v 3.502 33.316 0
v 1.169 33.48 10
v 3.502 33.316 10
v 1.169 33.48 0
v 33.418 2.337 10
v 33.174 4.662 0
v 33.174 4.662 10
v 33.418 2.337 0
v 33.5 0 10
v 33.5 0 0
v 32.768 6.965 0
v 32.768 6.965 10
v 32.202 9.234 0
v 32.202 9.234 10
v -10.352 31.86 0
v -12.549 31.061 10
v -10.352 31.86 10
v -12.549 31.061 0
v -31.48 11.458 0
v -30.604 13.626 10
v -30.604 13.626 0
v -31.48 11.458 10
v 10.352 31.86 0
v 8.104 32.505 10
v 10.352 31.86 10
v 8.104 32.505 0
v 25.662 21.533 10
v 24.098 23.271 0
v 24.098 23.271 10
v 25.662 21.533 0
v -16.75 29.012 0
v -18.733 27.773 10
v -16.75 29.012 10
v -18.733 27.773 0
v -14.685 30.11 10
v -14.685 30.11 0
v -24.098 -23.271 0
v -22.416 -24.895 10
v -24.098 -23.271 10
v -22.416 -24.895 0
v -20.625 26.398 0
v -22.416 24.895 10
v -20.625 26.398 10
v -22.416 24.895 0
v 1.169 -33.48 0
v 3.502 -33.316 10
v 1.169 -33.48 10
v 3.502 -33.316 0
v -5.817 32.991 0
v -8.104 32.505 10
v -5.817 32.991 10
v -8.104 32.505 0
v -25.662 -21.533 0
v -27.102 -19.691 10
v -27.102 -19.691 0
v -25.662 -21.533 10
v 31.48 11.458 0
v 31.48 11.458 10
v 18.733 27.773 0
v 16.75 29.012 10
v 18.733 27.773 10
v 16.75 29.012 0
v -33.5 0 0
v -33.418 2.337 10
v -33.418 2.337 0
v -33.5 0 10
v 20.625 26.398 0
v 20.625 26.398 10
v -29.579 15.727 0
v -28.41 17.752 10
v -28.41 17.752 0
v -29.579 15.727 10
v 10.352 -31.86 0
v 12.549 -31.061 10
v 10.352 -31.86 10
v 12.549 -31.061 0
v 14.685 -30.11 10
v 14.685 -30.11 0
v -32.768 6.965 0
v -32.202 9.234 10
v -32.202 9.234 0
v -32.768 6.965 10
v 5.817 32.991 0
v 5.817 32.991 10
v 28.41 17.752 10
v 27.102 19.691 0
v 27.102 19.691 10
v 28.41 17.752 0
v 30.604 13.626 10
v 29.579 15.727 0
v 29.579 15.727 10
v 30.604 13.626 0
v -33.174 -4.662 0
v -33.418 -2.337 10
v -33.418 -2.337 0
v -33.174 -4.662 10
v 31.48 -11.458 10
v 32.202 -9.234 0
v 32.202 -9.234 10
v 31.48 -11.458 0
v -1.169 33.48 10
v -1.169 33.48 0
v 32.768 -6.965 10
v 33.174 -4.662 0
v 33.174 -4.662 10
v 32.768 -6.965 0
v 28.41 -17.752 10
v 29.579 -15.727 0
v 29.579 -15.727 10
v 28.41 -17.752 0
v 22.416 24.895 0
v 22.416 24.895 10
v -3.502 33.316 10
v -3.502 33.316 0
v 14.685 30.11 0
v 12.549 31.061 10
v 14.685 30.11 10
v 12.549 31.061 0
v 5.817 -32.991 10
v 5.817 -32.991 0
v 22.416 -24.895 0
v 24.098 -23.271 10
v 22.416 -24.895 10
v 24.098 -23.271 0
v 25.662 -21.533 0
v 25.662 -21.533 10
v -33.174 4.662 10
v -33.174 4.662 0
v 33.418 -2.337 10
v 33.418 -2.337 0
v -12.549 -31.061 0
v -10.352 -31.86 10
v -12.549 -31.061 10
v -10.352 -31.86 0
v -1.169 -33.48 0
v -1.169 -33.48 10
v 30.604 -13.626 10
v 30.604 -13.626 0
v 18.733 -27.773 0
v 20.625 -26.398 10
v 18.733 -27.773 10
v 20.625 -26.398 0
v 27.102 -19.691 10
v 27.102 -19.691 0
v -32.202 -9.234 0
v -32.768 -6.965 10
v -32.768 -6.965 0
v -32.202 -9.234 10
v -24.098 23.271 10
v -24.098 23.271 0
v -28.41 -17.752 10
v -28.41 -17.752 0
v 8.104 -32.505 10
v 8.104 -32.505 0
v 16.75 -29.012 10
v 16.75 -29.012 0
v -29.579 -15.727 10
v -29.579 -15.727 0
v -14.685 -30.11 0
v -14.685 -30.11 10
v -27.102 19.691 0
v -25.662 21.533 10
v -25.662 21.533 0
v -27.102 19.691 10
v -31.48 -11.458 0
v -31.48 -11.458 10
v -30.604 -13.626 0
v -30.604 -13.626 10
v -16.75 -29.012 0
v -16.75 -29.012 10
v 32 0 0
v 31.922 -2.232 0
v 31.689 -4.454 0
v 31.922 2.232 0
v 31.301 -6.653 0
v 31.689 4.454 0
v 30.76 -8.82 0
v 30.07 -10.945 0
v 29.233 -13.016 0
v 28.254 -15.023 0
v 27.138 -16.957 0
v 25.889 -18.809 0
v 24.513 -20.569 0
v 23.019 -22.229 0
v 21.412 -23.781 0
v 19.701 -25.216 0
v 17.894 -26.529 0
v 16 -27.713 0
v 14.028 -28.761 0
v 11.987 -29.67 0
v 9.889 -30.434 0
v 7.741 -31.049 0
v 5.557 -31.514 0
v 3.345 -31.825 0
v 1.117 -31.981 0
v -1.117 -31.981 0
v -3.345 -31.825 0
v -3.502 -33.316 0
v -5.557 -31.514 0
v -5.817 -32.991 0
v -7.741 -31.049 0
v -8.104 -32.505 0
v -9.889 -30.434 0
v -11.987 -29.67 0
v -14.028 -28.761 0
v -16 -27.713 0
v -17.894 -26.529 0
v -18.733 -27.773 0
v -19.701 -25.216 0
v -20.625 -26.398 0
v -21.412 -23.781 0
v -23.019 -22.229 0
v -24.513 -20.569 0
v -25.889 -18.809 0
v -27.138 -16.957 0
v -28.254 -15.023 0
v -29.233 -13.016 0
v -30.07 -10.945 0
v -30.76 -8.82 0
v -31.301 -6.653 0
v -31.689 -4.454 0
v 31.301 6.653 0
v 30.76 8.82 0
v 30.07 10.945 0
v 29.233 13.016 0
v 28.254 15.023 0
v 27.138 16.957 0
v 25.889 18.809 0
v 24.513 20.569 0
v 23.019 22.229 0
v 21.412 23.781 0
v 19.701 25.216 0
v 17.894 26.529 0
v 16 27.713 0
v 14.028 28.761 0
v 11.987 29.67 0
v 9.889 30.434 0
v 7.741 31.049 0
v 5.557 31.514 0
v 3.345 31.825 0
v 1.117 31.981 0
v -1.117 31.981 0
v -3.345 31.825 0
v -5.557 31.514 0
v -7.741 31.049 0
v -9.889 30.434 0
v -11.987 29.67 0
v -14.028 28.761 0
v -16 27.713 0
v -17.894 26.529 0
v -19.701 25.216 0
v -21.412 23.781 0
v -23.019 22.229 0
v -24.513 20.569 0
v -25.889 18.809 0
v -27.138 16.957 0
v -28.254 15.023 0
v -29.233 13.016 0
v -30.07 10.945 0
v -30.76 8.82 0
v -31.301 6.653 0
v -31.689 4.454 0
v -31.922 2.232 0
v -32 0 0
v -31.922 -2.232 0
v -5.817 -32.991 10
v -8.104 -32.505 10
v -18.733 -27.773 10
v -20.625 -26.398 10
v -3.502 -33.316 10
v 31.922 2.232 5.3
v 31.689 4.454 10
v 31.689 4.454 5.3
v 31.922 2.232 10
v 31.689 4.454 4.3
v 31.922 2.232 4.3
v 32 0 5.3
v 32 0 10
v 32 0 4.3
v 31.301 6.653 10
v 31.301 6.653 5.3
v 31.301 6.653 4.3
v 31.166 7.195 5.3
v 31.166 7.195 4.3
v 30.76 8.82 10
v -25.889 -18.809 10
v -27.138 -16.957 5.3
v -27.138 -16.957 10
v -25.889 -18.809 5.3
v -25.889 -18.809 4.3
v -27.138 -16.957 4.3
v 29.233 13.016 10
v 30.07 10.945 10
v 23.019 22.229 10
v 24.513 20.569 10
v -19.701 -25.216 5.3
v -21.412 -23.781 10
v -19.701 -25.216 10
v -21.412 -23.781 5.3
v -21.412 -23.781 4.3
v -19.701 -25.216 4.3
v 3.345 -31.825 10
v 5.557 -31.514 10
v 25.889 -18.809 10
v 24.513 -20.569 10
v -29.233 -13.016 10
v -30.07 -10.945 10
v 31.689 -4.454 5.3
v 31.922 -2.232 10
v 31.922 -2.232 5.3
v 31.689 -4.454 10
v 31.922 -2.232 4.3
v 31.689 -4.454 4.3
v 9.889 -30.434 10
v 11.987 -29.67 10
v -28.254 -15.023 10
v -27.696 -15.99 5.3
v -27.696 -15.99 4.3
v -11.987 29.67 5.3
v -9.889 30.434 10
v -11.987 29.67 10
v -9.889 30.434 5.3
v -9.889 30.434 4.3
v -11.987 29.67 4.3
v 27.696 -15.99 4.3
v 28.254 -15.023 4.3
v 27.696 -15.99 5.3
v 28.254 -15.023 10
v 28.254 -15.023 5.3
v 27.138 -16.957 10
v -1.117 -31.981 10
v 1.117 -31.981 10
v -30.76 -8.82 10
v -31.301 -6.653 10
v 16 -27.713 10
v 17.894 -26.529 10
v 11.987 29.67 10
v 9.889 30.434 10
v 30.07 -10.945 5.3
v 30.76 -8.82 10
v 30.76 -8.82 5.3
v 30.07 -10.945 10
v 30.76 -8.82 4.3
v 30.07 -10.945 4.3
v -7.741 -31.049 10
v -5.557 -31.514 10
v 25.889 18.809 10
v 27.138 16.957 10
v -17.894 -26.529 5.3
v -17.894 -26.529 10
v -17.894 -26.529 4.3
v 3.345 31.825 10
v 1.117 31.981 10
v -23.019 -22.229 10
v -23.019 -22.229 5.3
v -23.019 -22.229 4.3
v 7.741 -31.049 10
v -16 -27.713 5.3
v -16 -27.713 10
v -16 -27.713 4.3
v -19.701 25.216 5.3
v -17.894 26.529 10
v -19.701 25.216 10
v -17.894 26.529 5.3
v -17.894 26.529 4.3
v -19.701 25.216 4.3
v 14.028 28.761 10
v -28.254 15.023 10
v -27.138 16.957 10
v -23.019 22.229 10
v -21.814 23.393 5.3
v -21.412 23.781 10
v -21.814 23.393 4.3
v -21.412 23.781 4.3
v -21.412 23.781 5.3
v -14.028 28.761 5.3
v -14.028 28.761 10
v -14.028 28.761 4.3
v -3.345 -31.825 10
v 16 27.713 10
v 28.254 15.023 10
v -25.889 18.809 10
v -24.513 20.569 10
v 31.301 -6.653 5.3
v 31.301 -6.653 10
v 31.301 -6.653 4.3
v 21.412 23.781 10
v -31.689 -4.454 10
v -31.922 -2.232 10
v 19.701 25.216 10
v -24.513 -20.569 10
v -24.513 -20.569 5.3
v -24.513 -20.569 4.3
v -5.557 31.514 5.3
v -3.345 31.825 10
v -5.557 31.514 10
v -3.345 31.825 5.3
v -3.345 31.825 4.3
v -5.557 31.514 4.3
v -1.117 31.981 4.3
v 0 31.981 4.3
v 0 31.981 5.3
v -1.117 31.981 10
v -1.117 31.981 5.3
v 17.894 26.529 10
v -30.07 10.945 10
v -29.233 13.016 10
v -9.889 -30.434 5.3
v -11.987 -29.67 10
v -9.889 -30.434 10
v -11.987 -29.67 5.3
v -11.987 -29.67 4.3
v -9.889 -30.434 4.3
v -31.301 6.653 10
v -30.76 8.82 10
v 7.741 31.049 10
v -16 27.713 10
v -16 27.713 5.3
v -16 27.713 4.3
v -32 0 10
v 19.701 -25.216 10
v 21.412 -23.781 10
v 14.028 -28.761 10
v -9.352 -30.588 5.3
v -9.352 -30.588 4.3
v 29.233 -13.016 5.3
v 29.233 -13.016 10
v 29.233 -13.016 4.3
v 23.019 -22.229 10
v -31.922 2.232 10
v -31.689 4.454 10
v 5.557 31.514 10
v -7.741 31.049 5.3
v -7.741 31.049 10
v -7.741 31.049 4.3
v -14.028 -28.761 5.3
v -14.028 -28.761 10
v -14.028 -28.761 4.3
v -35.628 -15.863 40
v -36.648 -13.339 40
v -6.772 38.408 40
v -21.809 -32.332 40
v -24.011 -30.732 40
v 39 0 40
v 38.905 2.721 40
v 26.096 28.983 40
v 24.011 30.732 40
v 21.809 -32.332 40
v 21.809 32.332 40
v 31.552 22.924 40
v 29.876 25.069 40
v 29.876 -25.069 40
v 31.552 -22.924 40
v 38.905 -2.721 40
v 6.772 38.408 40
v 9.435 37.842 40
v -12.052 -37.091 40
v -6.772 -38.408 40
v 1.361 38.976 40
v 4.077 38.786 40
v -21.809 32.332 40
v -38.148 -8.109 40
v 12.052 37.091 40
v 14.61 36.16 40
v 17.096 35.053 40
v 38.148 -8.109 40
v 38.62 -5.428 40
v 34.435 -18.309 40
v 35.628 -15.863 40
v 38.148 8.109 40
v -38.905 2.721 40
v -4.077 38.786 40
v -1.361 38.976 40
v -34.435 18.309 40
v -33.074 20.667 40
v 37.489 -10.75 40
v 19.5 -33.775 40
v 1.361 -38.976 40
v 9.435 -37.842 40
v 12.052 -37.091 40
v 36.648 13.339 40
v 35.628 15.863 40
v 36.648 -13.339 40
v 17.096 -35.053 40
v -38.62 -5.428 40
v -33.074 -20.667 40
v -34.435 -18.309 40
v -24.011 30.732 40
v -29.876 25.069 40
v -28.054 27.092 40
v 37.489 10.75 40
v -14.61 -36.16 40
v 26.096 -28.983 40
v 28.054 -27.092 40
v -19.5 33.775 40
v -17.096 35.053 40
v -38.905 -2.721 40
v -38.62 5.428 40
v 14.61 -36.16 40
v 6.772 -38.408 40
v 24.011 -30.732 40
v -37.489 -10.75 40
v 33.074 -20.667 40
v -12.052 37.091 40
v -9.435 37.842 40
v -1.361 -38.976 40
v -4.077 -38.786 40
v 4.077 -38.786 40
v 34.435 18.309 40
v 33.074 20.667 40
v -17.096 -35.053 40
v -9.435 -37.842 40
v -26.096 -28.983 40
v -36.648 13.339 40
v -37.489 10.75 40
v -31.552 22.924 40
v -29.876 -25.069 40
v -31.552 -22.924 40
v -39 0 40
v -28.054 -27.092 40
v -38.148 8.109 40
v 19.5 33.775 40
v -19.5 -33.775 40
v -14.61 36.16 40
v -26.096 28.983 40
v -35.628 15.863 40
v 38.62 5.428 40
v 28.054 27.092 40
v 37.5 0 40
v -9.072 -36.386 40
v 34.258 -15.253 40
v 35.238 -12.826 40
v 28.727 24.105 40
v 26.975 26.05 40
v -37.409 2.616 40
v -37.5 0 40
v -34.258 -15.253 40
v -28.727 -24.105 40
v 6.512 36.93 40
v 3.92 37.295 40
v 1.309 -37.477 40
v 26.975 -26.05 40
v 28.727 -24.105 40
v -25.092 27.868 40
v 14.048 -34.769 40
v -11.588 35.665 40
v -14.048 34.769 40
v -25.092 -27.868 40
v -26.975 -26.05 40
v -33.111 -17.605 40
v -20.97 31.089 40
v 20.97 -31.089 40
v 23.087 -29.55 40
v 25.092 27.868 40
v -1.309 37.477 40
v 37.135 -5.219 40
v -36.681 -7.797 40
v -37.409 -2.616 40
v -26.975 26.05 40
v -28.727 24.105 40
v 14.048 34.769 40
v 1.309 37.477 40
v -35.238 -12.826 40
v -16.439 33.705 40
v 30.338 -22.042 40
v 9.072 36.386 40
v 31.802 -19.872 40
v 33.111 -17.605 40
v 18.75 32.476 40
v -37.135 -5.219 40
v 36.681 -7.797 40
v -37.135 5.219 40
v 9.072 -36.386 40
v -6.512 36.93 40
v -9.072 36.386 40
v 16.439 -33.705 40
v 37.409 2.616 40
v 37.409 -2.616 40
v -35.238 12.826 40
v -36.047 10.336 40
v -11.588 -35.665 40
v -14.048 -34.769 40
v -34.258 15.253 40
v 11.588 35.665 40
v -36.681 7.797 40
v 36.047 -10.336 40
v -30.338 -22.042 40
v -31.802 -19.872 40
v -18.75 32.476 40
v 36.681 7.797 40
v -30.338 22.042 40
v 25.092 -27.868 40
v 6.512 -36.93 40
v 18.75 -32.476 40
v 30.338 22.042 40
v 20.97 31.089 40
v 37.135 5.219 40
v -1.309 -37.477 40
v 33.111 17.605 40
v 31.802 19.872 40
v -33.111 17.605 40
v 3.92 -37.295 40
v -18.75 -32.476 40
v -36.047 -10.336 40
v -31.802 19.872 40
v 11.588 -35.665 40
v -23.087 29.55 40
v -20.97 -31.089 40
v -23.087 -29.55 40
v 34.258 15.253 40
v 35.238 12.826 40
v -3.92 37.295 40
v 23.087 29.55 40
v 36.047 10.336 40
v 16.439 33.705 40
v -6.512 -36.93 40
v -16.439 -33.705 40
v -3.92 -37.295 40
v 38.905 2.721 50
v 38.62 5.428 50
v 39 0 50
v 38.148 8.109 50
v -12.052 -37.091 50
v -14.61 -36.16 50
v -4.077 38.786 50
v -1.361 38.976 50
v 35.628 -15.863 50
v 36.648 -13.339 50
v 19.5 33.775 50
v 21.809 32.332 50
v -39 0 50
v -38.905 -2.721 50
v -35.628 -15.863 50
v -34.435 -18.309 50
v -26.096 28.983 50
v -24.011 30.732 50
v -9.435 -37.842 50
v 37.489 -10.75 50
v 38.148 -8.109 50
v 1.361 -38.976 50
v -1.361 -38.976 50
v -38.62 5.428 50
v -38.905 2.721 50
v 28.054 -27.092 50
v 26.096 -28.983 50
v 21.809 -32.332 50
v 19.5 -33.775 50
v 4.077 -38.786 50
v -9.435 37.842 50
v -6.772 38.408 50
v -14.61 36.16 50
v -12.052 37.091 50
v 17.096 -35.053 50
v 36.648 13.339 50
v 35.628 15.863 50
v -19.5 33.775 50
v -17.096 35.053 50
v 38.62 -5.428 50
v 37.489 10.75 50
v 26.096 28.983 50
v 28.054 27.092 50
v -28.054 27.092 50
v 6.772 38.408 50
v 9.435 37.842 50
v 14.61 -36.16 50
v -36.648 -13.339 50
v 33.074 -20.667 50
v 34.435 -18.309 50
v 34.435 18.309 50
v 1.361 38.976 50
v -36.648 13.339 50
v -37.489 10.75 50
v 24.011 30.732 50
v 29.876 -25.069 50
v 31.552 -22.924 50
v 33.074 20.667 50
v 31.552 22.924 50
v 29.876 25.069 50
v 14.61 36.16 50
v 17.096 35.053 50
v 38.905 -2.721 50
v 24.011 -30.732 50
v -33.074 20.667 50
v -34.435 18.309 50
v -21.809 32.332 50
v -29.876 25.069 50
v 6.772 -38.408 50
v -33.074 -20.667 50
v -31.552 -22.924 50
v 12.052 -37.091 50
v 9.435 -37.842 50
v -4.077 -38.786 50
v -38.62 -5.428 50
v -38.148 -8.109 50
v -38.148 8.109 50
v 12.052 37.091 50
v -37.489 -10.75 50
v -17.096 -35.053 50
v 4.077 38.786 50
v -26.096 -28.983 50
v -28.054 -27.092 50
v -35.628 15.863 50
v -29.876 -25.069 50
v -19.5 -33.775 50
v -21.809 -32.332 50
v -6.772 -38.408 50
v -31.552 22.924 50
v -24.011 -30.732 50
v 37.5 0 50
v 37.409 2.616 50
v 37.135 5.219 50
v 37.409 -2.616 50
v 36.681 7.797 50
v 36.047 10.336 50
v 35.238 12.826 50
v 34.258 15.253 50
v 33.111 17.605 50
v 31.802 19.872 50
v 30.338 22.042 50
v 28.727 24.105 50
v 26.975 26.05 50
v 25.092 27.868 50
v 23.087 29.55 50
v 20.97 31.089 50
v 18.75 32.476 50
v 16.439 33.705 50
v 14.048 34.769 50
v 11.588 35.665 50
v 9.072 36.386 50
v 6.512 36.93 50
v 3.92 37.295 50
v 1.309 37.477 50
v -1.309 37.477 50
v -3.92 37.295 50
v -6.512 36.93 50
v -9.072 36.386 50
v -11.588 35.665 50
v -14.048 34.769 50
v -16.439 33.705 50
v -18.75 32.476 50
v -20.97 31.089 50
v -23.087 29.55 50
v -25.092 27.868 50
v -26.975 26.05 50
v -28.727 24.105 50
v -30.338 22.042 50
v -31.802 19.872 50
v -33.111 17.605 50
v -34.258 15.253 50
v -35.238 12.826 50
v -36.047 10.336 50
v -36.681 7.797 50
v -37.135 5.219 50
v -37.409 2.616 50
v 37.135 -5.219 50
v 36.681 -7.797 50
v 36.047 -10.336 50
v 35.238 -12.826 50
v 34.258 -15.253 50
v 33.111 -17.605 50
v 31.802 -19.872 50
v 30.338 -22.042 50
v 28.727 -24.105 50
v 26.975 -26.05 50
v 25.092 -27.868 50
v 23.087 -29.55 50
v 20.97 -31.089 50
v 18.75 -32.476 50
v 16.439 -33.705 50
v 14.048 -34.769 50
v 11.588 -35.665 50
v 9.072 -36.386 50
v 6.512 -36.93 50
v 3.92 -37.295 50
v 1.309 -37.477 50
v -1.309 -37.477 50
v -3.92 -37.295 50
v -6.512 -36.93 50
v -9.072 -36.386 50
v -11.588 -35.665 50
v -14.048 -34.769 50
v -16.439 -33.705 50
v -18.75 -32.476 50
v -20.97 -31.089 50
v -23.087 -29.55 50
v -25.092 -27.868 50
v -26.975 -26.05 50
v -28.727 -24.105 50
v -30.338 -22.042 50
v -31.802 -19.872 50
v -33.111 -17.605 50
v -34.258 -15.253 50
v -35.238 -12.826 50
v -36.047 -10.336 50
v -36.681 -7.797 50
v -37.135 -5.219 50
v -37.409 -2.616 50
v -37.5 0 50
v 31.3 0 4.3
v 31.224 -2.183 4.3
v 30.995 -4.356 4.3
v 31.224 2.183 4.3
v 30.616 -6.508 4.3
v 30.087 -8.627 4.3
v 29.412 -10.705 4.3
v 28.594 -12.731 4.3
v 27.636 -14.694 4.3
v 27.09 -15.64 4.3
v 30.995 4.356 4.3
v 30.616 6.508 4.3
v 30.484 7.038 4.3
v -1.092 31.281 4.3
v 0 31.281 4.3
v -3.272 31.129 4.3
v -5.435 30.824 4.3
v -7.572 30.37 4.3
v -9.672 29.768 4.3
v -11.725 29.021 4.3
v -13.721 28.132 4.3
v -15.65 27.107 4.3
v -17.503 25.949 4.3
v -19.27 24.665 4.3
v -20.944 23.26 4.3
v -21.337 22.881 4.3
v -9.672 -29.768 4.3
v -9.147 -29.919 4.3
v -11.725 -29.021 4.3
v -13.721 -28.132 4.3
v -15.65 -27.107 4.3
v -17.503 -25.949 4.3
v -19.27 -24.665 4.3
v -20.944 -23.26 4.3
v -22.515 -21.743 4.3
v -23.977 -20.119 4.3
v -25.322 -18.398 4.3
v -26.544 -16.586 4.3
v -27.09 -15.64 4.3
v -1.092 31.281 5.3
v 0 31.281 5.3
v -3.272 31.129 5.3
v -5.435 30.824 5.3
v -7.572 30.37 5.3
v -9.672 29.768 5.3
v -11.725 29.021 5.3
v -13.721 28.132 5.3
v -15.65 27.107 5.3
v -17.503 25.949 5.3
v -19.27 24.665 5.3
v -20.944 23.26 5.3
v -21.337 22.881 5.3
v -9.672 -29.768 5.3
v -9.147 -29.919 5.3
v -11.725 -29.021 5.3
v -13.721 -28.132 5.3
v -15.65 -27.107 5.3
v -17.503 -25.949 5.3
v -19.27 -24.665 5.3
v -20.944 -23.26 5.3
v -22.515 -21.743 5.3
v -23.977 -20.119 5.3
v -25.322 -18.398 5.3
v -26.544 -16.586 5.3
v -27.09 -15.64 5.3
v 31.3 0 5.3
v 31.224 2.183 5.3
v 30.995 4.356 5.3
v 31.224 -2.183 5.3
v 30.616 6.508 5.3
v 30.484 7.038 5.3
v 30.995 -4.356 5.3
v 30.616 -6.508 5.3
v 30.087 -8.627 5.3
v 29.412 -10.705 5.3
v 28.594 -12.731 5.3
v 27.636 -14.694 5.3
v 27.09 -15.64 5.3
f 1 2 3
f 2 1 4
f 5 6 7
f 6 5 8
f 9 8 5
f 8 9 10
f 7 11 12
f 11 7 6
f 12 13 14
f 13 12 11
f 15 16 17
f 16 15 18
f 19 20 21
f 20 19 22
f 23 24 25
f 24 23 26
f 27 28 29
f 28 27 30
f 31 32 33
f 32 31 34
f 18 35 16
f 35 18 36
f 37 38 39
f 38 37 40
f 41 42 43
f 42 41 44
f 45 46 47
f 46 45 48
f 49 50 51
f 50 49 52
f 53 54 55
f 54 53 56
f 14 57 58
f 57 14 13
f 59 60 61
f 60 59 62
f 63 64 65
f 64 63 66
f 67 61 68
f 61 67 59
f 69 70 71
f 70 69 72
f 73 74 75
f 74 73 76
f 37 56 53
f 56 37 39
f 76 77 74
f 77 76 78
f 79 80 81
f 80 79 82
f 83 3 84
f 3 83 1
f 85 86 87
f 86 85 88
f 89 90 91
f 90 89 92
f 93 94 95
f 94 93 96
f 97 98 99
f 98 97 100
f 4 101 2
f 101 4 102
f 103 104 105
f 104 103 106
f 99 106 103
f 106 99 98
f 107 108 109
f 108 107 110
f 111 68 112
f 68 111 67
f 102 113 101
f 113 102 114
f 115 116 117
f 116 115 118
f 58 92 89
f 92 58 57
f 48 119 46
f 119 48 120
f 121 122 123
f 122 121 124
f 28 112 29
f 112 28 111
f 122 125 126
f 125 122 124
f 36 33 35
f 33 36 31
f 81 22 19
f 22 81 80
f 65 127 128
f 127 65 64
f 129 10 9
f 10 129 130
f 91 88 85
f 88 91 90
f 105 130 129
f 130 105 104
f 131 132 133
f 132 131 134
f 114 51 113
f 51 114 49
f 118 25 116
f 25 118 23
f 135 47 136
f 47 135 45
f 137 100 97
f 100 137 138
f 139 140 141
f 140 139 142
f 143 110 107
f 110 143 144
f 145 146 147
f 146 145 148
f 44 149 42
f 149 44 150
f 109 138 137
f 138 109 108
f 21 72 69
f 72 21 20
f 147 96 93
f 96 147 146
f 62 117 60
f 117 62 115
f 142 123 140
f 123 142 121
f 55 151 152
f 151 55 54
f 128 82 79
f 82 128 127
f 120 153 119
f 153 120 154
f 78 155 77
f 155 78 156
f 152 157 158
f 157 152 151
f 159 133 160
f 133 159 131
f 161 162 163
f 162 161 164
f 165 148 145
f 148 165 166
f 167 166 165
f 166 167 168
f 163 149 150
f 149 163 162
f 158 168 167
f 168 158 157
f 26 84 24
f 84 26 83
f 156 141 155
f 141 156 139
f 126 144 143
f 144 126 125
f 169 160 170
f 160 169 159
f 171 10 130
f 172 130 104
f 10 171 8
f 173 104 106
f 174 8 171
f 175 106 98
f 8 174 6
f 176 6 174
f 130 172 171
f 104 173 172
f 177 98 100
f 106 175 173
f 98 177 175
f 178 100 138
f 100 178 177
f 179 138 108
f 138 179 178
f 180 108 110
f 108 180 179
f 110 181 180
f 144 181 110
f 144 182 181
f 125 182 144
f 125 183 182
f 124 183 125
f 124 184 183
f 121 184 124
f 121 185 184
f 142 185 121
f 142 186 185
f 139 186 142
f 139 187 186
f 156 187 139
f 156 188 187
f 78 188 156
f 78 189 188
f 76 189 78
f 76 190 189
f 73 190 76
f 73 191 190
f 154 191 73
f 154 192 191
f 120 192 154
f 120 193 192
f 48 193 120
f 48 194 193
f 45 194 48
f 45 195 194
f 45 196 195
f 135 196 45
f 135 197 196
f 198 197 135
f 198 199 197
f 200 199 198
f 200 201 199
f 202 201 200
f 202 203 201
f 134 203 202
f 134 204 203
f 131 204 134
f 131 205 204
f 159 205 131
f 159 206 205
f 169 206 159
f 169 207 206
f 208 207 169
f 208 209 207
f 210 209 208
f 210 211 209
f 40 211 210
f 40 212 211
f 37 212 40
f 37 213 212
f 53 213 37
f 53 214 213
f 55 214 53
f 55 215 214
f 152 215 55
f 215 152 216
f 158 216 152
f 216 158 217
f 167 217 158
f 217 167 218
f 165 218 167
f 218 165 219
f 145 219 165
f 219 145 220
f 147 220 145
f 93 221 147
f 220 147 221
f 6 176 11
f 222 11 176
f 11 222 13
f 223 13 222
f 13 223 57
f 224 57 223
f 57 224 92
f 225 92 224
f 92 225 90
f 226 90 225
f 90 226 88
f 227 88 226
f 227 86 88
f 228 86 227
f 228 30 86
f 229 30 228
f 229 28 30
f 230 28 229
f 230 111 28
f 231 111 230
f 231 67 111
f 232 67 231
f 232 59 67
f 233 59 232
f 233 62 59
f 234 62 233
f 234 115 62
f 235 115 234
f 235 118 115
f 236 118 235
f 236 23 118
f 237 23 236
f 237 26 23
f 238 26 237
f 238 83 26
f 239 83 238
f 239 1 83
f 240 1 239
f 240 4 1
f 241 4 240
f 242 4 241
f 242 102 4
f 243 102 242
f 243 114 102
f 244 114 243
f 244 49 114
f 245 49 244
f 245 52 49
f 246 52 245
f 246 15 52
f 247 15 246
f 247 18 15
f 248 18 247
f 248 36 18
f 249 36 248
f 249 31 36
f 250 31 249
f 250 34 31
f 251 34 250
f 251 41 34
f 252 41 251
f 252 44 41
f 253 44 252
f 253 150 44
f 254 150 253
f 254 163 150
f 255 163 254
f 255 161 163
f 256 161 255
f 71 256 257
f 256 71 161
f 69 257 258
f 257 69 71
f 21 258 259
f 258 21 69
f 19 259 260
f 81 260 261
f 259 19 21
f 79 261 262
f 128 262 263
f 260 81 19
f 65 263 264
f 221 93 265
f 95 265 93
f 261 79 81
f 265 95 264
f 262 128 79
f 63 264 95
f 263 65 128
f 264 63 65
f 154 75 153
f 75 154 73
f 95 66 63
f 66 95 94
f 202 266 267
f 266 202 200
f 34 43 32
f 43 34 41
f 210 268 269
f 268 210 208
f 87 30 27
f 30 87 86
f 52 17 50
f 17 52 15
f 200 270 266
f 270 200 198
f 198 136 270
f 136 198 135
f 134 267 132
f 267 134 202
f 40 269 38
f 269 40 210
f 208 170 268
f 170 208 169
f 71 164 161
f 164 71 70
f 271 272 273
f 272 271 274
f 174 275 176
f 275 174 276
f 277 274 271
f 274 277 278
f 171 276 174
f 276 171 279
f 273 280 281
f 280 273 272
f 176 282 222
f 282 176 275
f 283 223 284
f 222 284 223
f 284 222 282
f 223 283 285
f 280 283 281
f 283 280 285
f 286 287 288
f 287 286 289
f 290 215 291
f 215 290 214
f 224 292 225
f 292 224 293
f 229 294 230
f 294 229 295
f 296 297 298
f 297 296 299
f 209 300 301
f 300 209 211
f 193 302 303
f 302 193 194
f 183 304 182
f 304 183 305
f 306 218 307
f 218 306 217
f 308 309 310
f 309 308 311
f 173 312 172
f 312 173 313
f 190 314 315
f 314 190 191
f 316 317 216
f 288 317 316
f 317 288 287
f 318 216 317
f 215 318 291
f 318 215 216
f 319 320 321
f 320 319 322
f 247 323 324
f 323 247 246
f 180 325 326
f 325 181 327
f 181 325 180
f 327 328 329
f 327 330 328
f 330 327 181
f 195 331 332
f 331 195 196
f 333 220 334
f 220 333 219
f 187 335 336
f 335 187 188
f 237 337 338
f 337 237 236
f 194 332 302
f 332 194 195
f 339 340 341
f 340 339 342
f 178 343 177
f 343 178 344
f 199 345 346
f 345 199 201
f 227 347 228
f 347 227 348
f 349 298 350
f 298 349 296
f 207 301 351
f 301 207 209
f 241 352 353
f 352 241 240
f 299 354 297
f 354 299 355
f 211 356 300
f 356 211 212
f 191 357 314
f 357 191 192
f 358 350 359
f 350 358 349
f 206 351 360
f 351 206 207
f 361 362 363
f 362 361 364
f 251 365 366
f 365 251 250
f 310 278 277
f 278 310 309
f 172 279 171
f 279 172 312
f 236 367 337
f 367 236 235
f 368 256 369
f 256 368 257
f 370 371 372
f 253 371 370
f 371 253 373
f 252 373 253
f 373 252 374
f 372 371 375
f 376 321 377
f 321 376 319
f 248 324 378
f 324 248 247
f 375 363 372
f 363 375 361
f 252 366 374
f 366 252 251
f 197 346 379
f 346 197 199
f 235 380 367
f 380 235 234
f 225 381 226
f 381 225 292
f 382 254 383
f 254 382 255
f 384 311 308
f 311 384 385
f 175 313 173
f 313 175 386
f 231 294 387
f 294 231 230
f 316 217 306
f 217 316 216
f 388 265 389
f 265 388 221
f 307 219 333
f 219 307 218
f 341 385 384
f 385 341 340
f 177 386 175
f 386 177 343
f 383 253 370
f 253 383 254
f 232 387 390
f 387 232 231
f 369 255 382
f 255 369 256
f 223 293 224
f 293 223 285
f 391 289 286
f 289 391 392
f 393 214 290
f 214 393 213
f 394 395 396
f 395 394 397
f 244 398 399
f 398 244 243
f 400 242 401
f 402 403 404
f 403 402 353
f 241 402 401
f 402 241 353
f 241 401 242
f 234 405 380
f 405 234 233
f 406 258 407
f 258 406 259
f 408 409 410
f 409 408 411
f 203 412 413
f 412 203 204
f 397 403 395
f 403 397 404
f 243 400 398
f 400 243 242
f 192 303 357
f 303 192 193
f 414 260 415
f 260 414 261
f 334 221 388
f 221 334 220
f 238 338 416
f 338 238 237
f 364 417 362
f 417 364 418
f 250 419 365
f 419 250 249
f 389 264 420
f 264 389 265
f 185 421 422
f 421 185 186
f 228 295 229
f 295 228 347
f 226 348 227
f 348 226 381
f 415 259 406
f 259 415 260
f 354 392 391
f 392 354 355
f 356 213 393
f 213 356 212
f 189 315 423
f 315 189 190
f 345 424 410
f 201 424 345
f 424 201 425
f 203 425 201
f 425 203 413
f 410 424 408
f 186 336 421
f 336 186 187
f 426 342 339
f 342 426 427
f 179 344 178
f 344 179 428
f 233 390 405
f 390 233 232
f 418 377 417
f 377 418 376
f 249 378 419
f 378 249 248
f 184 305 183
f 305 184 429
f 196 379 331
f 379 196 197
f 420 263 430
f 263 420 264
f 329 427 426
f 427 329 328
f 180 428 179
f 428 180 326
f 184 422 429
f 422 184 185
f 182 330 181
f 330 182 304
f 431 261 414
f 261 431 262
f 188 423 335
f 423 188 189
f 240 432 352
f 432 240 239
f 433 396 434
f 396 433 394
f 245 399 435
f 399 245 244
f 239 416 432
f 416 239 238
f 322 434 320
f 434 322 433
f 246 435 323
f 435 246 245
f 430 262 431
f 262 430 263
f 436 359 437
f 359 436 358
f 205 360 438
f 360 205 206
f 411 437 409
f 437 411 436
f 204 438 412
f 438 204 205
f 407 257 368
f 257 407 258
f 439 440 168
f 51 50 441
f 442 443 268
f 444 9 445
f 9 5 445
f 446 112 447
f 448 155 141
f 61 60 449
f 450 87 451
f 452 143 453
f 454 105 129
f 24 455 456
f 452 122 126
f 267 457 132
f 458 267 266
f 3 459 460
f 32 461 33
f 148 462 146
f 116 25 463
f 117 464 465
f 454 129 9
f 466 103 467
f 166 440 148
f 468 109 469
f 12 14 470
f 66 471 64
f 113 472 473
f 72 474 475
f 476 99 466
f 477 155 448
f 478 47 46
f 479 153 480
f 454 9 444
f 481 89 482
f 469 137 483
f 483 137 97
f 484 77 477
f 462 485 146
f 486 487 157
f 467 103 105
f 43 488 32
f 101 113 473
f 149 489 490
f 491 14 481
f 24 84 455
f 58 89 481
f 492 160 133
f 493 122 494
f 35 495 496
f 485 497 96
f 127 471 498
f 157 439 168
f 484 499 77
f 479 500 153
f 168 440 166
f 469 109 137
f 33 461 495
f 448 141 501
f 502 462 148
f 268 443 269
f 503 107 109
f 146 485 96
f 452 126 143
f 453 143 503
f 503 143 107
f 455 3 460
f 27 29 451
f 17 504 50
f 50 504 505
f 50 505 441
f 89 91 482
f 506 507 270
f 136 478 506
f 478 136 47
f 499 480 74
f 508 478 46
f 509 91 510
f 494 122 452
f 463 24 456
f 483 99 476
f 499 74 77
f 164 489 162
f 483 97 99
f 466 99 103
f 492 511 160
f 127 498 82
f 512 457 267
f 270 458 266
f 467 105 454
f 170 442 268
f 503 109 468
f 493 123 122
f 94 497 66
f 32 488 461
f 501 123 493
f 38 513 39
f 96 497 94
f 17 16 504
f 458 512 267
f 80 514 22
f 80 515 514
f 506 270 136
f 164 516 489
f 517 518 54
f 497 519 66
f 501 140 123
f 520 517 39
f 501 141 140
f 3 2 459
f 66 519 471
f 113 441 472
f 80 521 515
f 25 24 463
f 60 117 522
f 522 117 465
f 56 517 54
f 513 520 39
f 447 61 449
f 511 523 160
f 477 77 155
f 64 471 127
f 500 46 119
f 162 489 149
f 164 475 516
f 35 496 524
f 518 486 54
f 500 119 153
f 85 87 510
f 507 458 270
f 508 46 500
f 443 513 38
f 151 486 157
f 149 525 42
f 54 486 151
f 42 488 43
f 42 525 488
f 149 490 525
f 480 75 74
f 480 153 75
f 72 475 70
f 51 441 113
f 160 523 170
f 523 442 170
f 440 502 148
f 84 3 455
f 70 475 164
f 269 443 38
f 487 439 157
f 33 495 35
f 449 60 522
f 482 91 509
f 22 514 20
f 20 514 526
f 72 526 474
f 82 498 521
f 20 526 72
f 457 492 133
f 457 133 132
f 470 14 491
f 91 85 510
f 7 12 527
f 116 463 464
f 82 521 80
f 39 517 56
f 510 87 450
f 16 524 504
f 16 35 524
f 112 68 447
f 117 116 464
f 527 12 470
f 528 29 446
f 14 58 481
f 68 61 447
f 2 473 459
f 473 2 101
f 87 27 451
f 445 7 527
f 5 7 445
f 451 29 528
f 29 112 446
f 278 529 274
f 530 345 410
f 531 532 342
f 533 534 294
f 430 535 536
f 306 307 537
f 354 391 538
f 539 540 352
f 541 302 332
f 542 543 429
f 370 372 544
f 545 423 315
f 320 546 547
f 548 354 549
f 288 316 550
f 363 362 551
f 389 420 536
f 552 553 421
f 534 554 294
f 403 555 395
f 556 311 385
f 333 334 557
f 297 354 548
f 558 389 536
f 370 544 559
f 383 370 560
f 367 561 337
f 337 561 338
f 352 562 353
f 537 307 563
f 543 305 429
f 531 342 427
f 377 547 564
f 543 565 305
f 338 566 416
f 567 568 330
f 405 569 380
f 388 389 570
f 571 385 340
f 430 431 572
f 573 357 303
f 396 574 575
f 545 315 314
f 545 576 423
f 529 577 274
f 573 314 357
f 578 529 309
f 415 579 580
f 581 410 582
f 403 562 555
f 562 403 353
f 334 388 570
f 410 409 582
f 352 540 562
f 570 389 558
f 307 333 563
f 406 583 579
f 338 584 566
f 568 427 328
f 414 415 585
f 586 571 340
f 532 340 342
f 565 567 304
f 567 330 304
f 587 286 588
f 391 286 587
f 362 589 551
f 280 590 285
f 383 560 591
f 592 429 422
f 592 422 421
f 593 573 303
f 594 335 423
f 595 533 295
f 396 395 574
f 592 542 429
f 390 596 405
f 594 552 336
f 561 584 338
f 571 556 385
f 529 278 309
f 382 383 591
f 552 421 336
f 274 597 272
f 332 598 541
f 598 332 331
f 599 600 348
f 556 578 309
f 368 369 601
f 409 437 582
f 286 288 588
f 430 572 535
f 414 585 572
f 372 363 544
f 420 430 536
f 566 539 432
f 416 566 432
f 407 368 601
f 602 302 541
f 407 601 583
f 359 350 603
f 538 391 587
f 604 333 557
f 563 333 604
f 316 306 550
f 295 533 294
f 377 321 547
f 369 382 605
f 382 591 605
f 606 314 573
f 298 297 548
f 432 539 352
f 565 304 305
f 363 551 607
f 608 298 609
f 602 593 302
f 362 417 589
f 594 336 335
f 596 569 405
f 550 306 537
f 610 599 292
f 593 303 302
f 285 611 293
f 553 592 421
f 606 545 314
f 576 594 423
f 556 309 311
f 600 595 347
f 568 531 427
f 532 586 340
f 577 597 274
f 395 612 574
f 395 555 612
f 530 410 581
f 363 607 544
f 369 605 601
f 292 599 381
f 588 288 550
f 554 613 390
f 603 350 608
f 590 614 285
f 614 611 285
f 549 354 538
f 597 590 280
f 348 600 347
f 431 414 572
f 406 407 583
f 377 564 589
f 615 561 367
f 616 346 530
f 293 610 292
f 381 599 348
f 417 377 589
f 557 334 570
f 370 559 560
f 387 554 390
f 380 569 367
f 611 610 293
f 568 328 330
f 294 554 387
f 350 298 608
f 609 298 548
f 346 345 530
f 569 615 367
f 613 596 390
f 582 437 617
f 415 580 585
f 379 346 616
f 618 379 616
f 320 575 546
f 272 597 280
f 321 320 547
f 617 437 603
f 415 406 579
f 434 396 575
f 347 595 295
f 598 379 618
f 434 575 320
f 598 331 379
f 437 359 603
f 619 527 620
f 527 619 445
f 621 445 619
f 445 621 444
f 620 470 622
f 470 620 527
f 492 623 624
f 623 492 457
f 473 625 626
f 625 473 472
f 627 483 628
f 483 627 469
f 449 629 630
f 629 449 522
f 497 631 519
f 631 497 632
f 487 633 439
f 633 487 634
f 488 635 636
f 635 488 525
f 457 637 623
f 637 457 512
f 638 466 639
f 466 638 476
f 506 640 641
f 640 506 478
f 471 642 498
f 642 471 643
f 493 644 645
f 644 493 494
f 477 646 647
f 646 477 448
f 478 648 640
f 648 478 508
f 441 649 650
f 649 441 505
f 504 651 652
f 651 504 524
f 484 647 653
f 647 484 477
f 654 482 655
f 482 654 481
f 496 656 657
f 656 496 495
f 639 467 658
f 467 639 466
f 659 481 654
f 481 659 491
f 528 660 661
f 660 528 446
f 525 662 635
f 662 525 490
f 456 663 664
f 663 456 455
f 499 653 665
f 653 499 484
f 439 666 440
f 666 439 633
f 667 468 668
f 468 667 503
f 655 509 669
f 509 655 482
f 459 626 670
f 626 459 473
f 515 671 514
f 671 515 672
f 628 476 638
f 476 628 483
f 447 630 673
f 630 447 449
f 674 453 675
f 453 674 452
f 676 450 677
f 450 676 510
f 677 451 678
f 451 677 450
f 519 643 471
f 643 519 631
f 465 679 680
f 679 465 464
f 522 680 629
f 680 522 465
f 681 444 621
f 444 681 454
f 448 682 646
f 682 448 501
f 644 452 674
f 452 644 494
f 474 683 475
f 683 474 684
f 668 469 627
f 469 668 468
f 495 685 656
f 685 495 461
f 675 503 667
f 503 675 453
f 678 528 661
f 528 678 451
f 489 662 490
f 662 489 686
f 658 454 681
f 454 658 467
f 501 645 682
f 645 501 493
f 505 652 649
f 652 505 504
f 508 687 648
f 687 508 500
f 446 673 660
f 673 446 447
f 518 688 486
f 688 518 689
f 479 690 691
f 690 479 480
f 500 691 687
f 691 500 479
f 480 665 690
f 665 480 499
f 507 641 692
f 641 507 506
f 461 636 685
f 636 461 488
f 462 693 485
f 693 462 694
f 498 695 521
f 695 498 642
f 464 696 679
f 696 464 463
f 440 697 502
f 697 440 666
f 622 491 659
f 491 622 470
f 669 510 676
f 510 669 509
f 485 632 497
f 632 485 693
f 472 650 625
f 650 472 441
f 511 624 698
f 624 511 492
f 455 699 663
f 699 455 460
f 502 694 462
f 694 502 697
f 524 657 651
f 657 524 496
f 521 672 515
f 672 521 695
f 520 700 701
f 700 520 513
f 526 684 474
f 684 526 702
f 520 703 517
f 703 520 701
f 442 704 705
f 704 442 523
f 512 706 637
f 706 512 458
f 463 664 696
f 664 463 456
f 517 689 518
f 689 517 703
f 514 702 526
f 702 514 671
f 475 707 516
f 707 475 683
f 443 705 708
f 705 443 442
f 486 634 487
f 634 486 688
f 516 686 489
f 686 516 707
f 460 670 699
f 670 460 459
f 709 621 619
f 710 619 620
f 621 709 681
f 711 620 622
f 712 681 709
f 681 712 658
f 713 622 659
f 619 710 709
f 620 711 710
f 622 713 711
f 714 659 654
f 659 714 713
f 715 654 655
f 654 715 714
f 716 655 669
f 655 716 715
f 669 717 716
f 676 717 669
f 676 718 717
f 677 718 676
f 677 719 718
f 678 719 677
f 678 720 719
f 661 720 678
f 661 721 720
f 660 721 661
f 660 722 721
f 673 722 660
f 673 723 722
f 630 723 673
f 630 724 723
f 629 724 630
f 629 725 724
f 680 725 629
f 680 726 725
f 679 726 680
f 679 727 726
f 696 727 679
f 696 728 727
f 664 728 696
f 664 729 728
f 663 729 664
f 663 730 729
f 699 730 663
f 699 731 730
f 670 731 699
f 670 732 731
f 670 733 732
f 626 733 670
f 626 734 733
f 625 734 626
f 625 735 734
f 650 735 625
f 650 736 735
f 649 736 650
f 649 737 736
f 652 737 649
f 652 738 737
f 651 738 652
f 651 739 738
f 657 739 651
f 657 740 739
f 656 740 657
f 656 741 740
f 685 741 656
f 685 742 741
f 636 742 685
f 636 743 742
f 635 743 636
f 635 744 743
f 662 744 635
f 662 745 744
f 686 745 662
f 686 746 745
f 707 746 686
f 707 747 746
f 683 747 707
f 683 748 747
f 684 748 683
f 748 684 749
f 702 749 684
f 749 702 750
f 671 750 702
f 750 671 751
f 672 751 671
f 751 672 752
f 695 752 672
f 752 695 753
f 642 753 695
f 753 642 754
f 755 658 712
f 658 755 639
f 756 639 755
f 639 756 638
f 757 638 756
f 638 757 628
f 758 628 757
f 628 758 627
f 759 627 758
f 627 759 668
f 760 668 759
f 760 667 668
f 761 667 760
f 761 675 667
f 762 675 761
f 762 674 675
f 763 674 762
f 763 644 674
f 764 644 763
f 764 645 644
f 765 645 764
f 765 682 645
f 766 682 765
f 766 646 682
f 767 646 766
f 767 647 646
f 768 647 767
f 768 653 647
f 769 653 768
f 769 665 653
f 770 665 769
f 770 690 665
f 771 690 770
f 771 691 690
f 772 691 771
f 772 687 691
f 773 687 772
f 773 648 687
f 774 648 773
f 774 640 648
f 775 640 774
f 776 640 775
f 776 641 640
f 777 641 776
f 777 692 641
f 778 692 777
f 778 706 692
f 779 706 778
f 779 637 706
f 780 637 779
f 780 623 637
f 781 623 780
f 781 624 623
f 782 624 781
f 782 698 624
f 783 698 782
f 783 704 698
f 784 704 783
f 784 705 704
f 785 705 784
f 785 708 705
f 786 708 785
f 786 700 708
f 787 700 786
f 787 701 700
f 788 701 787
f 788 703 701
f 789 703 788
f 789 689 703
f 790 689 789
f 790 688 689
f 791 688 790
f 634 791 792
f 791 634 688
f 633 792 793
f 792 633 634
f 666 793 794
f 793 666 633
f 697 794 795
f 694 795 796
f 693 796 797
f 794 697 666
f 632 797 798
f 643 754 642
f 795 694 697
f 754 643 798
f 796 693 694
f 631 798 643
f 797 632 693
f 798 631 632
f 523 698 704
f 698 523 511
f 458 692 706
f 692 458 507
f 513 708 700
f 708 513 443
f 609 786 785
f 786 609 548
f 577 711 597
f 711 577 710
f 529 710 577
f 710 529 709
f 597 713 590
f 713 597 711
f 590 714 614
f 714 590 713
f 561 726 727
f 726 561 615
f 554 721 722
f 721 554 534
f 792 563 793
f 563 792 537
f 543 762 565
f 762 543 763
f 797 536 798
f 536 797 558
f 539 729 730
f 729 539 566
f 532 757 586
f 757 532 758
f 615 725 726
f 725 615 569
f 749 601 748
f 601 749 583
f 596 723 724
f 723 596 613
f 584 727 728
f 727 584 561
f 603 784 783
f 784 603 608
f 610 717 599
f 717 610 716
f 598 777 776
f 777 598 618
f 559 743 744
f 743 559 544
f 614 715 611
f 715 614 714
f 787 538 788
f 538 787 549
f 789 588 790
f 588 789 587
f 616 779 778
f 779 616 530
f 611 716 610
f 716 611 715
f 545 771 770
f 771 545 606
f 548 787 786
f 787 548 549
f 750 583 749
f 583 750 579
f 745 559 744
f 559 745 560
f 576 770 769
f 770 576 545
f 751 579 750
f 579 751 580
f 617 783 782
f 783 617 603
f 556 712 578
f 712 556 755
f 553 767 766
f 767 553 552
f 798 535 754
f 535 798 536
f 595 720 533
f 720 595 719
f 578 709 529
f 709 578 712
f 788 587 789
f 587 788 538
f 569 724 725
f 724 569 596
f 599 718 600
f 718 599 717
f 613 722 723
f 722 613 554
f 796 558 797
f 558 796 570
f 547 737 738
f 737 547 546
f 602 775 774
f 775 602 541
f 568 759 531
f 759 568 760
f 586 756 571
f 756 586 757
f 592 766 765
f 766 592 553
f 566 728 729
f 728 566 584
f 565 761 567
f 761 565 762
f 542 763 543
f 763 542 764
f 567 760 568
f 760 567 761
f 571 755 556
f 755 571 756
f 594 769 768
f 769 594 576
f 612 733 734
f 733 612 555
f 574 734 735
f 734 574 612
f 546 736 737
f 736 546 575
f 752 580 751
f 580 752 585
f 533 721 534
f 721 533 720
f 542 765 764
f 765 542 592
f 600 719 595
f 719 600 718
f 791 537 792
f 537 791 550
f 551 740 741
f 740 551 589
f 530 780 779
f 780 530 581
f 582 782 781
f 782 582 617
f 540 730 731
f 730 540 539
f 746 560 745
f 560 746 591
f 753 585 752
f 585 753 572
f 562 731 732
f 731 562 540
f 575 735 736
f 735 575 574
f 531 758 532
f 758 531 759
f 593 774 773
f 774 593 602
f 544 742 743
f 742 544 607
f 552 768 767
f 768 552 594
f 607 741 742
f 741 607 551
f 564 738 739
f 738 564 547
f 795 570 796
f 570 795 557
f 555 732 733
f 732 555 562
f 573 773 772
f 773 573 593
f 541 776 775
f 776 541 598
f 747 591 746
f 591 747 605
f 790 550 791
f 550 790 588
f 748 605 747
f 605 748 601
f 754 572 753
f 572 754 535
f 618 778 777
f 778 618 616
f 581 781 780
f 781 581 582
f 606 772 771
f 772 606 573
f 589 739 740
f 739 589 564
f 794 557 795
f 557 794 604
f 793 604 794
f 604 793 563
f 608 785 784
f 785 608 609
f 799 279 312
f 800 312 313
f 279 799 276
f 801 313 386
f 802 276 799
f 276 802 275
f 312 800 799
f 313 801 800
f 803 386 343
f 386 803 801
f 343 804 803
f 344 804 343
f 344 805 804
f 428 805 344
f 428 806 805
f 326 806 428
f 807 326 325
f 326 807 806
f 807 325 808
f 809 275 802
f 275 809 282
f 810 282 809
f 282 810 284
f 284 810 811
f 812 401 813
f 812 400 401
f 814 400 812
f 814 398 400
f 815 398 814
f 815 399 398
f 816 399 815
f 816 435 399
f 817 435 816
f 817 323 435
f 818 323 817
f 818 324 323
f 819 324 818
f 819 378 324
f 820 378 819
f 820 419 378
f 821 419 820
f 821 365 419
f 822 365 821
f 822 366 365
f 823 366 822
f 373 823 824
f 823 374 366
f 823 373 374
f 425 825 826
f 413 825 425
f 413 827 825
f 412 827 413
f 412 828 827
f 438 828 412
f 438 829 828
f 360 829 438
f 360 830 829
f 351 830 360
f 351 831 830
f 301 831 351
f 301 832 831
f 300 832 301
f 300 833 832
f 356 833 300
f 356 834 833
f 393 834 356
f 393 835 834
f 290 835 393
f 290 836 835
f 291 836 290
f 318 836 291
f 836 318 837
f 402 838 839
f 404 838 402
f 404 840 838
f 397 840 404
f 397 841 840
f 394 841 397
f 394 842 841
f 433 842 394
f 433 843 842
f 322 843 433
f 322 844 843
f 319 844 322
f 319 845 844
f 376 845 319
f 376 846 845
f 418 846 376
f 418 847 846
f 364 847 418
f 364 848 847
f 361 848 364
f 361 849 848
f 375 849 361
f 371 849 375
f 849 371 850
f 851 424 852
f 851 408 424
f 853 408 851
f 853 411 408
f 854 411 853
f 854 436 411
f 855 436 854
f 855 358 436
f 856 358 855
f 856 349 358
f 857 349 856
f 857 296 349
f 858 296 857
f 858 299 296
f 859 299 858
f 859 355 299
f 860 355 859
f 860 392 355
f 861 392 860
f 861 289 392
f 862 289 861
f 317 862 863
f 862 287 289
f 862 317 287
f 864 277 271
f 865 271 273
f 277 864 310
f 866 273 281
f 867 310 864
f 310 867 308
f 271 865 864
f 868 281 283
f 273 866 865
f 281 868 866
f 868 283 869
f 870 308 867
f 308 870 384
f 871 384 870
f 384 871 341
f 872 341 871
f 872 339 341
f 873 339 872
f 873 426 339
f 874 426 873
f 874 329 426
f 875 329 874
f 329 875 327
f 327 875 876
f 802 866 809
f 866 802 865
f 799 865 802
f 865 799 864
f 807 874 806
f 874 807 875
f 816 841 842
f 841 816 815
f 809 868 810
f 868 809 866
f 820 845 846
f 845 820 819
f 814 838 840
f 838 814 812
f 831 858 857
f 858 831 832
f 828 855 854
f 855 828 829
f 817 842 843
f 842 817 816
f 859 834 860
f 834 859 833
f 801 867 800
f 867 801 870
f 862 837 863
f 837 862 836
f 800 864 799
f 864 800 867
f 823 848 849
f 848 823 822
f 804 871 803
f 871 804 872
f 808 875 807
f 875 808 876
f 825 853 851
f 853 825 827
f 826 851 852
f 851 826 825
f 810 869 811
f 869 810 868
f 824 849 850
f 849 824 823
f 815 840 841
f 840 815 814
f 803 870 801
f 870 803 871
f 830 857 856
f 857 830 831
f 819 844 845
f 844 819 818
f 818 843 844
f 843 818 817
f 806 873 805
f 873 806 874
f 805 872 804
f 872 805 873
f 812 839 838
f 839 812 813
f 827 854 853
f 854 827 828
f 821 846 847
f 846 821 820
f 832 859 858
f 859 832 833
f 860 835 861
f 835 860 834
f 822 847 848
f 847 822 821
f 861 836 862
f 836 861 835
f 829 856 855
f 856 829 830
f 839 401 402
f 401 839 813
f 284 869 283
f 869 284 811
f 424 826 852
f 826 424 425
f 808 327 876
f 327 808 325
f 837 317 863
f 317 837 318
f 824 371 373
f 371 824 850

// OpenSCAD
//Parameterised olympus bayonet lens hood generator
// Glyn Cowles Feb 2014


//Thickness of tube walls 
thickness=1.5; 
//Inside diameter of bottom tube 
d1_inside=64;   
//Height of bottom tube 
h1=10;   
//Inside diameter of top tube
d2_inside=75;   
//Height of top tube
h2=10;   
//Height of connector section
c_ht=30; 
// Percentage of circumference for one flange
f_pcent=12;
// Flange thickness
f_th=.7;
//Flange height
f_ht=1;
// Resolution
$fn=90;

d1=d1_inside+2*thickness;
d2=d2_inside+2*thickness;
mask_degree=ceil(120-(f_pcent/100*360)); // this is the angle of the pie_slice mask
assemble(); 
//-----------------------------------------------------------------------
module tube(d,h,t) { // diameter height thickness
rad=d/2;
difference() {
cylinder(h=h,r=rad);
cylinder(h=h,r=rad-t);
}
}
//-----------------------------------------------------------------------

module connector(){
difference() {
 cylinder (h=c_ht,r1=d1/2,r2=d2/2);
 cylinder (h=c_ht,r1=d1/2-thickness,r2=d2/2-thickness);
}
}
//-----------------------------------------------------------------------

module flange() { // the three connecting lugs at the base
  difference() {
  tube(d1-thickness*2,f_ht,f_th);
  union () { 	
  		pie_slice(0,mask_degree,d1,f_ht)  ; //65 deg is the amount to remove
  		pie_slice(120,mask_degree,d1,f_ht)  ;
  		pie_slice(240,mask_degree,d1,f_ht)  ;
	}
  }
}
//-----------------------------------------------------------------------

module pie_slice(a,b,rad,h) { // make a pie slice starting at angle a continuing for angle b with radius of rad and height of h
	x1=sin(a)*rad;
	y1=cos(a)*rad;
	x2=sin(a+b)*rad;
	y2=cos(a+b)*rad;
	linear_extrude(height=h) 
	polygon(
		points=[ [0,0],[x1,y1],[x2,y2]]
	); 
}
//-----------------------------------------------------------------------

module assemble() {
union() {
	tube(d1,h1,thickness); //bottom tube
	translate([0,0,h1]) connector();  // connector
	translate([0,0,h1+c_ht])  tube(d2,h2,thickness); // top tube
	translate([0,0,h1/2-f_th]) flange(); //connecting lugs
	}
};
